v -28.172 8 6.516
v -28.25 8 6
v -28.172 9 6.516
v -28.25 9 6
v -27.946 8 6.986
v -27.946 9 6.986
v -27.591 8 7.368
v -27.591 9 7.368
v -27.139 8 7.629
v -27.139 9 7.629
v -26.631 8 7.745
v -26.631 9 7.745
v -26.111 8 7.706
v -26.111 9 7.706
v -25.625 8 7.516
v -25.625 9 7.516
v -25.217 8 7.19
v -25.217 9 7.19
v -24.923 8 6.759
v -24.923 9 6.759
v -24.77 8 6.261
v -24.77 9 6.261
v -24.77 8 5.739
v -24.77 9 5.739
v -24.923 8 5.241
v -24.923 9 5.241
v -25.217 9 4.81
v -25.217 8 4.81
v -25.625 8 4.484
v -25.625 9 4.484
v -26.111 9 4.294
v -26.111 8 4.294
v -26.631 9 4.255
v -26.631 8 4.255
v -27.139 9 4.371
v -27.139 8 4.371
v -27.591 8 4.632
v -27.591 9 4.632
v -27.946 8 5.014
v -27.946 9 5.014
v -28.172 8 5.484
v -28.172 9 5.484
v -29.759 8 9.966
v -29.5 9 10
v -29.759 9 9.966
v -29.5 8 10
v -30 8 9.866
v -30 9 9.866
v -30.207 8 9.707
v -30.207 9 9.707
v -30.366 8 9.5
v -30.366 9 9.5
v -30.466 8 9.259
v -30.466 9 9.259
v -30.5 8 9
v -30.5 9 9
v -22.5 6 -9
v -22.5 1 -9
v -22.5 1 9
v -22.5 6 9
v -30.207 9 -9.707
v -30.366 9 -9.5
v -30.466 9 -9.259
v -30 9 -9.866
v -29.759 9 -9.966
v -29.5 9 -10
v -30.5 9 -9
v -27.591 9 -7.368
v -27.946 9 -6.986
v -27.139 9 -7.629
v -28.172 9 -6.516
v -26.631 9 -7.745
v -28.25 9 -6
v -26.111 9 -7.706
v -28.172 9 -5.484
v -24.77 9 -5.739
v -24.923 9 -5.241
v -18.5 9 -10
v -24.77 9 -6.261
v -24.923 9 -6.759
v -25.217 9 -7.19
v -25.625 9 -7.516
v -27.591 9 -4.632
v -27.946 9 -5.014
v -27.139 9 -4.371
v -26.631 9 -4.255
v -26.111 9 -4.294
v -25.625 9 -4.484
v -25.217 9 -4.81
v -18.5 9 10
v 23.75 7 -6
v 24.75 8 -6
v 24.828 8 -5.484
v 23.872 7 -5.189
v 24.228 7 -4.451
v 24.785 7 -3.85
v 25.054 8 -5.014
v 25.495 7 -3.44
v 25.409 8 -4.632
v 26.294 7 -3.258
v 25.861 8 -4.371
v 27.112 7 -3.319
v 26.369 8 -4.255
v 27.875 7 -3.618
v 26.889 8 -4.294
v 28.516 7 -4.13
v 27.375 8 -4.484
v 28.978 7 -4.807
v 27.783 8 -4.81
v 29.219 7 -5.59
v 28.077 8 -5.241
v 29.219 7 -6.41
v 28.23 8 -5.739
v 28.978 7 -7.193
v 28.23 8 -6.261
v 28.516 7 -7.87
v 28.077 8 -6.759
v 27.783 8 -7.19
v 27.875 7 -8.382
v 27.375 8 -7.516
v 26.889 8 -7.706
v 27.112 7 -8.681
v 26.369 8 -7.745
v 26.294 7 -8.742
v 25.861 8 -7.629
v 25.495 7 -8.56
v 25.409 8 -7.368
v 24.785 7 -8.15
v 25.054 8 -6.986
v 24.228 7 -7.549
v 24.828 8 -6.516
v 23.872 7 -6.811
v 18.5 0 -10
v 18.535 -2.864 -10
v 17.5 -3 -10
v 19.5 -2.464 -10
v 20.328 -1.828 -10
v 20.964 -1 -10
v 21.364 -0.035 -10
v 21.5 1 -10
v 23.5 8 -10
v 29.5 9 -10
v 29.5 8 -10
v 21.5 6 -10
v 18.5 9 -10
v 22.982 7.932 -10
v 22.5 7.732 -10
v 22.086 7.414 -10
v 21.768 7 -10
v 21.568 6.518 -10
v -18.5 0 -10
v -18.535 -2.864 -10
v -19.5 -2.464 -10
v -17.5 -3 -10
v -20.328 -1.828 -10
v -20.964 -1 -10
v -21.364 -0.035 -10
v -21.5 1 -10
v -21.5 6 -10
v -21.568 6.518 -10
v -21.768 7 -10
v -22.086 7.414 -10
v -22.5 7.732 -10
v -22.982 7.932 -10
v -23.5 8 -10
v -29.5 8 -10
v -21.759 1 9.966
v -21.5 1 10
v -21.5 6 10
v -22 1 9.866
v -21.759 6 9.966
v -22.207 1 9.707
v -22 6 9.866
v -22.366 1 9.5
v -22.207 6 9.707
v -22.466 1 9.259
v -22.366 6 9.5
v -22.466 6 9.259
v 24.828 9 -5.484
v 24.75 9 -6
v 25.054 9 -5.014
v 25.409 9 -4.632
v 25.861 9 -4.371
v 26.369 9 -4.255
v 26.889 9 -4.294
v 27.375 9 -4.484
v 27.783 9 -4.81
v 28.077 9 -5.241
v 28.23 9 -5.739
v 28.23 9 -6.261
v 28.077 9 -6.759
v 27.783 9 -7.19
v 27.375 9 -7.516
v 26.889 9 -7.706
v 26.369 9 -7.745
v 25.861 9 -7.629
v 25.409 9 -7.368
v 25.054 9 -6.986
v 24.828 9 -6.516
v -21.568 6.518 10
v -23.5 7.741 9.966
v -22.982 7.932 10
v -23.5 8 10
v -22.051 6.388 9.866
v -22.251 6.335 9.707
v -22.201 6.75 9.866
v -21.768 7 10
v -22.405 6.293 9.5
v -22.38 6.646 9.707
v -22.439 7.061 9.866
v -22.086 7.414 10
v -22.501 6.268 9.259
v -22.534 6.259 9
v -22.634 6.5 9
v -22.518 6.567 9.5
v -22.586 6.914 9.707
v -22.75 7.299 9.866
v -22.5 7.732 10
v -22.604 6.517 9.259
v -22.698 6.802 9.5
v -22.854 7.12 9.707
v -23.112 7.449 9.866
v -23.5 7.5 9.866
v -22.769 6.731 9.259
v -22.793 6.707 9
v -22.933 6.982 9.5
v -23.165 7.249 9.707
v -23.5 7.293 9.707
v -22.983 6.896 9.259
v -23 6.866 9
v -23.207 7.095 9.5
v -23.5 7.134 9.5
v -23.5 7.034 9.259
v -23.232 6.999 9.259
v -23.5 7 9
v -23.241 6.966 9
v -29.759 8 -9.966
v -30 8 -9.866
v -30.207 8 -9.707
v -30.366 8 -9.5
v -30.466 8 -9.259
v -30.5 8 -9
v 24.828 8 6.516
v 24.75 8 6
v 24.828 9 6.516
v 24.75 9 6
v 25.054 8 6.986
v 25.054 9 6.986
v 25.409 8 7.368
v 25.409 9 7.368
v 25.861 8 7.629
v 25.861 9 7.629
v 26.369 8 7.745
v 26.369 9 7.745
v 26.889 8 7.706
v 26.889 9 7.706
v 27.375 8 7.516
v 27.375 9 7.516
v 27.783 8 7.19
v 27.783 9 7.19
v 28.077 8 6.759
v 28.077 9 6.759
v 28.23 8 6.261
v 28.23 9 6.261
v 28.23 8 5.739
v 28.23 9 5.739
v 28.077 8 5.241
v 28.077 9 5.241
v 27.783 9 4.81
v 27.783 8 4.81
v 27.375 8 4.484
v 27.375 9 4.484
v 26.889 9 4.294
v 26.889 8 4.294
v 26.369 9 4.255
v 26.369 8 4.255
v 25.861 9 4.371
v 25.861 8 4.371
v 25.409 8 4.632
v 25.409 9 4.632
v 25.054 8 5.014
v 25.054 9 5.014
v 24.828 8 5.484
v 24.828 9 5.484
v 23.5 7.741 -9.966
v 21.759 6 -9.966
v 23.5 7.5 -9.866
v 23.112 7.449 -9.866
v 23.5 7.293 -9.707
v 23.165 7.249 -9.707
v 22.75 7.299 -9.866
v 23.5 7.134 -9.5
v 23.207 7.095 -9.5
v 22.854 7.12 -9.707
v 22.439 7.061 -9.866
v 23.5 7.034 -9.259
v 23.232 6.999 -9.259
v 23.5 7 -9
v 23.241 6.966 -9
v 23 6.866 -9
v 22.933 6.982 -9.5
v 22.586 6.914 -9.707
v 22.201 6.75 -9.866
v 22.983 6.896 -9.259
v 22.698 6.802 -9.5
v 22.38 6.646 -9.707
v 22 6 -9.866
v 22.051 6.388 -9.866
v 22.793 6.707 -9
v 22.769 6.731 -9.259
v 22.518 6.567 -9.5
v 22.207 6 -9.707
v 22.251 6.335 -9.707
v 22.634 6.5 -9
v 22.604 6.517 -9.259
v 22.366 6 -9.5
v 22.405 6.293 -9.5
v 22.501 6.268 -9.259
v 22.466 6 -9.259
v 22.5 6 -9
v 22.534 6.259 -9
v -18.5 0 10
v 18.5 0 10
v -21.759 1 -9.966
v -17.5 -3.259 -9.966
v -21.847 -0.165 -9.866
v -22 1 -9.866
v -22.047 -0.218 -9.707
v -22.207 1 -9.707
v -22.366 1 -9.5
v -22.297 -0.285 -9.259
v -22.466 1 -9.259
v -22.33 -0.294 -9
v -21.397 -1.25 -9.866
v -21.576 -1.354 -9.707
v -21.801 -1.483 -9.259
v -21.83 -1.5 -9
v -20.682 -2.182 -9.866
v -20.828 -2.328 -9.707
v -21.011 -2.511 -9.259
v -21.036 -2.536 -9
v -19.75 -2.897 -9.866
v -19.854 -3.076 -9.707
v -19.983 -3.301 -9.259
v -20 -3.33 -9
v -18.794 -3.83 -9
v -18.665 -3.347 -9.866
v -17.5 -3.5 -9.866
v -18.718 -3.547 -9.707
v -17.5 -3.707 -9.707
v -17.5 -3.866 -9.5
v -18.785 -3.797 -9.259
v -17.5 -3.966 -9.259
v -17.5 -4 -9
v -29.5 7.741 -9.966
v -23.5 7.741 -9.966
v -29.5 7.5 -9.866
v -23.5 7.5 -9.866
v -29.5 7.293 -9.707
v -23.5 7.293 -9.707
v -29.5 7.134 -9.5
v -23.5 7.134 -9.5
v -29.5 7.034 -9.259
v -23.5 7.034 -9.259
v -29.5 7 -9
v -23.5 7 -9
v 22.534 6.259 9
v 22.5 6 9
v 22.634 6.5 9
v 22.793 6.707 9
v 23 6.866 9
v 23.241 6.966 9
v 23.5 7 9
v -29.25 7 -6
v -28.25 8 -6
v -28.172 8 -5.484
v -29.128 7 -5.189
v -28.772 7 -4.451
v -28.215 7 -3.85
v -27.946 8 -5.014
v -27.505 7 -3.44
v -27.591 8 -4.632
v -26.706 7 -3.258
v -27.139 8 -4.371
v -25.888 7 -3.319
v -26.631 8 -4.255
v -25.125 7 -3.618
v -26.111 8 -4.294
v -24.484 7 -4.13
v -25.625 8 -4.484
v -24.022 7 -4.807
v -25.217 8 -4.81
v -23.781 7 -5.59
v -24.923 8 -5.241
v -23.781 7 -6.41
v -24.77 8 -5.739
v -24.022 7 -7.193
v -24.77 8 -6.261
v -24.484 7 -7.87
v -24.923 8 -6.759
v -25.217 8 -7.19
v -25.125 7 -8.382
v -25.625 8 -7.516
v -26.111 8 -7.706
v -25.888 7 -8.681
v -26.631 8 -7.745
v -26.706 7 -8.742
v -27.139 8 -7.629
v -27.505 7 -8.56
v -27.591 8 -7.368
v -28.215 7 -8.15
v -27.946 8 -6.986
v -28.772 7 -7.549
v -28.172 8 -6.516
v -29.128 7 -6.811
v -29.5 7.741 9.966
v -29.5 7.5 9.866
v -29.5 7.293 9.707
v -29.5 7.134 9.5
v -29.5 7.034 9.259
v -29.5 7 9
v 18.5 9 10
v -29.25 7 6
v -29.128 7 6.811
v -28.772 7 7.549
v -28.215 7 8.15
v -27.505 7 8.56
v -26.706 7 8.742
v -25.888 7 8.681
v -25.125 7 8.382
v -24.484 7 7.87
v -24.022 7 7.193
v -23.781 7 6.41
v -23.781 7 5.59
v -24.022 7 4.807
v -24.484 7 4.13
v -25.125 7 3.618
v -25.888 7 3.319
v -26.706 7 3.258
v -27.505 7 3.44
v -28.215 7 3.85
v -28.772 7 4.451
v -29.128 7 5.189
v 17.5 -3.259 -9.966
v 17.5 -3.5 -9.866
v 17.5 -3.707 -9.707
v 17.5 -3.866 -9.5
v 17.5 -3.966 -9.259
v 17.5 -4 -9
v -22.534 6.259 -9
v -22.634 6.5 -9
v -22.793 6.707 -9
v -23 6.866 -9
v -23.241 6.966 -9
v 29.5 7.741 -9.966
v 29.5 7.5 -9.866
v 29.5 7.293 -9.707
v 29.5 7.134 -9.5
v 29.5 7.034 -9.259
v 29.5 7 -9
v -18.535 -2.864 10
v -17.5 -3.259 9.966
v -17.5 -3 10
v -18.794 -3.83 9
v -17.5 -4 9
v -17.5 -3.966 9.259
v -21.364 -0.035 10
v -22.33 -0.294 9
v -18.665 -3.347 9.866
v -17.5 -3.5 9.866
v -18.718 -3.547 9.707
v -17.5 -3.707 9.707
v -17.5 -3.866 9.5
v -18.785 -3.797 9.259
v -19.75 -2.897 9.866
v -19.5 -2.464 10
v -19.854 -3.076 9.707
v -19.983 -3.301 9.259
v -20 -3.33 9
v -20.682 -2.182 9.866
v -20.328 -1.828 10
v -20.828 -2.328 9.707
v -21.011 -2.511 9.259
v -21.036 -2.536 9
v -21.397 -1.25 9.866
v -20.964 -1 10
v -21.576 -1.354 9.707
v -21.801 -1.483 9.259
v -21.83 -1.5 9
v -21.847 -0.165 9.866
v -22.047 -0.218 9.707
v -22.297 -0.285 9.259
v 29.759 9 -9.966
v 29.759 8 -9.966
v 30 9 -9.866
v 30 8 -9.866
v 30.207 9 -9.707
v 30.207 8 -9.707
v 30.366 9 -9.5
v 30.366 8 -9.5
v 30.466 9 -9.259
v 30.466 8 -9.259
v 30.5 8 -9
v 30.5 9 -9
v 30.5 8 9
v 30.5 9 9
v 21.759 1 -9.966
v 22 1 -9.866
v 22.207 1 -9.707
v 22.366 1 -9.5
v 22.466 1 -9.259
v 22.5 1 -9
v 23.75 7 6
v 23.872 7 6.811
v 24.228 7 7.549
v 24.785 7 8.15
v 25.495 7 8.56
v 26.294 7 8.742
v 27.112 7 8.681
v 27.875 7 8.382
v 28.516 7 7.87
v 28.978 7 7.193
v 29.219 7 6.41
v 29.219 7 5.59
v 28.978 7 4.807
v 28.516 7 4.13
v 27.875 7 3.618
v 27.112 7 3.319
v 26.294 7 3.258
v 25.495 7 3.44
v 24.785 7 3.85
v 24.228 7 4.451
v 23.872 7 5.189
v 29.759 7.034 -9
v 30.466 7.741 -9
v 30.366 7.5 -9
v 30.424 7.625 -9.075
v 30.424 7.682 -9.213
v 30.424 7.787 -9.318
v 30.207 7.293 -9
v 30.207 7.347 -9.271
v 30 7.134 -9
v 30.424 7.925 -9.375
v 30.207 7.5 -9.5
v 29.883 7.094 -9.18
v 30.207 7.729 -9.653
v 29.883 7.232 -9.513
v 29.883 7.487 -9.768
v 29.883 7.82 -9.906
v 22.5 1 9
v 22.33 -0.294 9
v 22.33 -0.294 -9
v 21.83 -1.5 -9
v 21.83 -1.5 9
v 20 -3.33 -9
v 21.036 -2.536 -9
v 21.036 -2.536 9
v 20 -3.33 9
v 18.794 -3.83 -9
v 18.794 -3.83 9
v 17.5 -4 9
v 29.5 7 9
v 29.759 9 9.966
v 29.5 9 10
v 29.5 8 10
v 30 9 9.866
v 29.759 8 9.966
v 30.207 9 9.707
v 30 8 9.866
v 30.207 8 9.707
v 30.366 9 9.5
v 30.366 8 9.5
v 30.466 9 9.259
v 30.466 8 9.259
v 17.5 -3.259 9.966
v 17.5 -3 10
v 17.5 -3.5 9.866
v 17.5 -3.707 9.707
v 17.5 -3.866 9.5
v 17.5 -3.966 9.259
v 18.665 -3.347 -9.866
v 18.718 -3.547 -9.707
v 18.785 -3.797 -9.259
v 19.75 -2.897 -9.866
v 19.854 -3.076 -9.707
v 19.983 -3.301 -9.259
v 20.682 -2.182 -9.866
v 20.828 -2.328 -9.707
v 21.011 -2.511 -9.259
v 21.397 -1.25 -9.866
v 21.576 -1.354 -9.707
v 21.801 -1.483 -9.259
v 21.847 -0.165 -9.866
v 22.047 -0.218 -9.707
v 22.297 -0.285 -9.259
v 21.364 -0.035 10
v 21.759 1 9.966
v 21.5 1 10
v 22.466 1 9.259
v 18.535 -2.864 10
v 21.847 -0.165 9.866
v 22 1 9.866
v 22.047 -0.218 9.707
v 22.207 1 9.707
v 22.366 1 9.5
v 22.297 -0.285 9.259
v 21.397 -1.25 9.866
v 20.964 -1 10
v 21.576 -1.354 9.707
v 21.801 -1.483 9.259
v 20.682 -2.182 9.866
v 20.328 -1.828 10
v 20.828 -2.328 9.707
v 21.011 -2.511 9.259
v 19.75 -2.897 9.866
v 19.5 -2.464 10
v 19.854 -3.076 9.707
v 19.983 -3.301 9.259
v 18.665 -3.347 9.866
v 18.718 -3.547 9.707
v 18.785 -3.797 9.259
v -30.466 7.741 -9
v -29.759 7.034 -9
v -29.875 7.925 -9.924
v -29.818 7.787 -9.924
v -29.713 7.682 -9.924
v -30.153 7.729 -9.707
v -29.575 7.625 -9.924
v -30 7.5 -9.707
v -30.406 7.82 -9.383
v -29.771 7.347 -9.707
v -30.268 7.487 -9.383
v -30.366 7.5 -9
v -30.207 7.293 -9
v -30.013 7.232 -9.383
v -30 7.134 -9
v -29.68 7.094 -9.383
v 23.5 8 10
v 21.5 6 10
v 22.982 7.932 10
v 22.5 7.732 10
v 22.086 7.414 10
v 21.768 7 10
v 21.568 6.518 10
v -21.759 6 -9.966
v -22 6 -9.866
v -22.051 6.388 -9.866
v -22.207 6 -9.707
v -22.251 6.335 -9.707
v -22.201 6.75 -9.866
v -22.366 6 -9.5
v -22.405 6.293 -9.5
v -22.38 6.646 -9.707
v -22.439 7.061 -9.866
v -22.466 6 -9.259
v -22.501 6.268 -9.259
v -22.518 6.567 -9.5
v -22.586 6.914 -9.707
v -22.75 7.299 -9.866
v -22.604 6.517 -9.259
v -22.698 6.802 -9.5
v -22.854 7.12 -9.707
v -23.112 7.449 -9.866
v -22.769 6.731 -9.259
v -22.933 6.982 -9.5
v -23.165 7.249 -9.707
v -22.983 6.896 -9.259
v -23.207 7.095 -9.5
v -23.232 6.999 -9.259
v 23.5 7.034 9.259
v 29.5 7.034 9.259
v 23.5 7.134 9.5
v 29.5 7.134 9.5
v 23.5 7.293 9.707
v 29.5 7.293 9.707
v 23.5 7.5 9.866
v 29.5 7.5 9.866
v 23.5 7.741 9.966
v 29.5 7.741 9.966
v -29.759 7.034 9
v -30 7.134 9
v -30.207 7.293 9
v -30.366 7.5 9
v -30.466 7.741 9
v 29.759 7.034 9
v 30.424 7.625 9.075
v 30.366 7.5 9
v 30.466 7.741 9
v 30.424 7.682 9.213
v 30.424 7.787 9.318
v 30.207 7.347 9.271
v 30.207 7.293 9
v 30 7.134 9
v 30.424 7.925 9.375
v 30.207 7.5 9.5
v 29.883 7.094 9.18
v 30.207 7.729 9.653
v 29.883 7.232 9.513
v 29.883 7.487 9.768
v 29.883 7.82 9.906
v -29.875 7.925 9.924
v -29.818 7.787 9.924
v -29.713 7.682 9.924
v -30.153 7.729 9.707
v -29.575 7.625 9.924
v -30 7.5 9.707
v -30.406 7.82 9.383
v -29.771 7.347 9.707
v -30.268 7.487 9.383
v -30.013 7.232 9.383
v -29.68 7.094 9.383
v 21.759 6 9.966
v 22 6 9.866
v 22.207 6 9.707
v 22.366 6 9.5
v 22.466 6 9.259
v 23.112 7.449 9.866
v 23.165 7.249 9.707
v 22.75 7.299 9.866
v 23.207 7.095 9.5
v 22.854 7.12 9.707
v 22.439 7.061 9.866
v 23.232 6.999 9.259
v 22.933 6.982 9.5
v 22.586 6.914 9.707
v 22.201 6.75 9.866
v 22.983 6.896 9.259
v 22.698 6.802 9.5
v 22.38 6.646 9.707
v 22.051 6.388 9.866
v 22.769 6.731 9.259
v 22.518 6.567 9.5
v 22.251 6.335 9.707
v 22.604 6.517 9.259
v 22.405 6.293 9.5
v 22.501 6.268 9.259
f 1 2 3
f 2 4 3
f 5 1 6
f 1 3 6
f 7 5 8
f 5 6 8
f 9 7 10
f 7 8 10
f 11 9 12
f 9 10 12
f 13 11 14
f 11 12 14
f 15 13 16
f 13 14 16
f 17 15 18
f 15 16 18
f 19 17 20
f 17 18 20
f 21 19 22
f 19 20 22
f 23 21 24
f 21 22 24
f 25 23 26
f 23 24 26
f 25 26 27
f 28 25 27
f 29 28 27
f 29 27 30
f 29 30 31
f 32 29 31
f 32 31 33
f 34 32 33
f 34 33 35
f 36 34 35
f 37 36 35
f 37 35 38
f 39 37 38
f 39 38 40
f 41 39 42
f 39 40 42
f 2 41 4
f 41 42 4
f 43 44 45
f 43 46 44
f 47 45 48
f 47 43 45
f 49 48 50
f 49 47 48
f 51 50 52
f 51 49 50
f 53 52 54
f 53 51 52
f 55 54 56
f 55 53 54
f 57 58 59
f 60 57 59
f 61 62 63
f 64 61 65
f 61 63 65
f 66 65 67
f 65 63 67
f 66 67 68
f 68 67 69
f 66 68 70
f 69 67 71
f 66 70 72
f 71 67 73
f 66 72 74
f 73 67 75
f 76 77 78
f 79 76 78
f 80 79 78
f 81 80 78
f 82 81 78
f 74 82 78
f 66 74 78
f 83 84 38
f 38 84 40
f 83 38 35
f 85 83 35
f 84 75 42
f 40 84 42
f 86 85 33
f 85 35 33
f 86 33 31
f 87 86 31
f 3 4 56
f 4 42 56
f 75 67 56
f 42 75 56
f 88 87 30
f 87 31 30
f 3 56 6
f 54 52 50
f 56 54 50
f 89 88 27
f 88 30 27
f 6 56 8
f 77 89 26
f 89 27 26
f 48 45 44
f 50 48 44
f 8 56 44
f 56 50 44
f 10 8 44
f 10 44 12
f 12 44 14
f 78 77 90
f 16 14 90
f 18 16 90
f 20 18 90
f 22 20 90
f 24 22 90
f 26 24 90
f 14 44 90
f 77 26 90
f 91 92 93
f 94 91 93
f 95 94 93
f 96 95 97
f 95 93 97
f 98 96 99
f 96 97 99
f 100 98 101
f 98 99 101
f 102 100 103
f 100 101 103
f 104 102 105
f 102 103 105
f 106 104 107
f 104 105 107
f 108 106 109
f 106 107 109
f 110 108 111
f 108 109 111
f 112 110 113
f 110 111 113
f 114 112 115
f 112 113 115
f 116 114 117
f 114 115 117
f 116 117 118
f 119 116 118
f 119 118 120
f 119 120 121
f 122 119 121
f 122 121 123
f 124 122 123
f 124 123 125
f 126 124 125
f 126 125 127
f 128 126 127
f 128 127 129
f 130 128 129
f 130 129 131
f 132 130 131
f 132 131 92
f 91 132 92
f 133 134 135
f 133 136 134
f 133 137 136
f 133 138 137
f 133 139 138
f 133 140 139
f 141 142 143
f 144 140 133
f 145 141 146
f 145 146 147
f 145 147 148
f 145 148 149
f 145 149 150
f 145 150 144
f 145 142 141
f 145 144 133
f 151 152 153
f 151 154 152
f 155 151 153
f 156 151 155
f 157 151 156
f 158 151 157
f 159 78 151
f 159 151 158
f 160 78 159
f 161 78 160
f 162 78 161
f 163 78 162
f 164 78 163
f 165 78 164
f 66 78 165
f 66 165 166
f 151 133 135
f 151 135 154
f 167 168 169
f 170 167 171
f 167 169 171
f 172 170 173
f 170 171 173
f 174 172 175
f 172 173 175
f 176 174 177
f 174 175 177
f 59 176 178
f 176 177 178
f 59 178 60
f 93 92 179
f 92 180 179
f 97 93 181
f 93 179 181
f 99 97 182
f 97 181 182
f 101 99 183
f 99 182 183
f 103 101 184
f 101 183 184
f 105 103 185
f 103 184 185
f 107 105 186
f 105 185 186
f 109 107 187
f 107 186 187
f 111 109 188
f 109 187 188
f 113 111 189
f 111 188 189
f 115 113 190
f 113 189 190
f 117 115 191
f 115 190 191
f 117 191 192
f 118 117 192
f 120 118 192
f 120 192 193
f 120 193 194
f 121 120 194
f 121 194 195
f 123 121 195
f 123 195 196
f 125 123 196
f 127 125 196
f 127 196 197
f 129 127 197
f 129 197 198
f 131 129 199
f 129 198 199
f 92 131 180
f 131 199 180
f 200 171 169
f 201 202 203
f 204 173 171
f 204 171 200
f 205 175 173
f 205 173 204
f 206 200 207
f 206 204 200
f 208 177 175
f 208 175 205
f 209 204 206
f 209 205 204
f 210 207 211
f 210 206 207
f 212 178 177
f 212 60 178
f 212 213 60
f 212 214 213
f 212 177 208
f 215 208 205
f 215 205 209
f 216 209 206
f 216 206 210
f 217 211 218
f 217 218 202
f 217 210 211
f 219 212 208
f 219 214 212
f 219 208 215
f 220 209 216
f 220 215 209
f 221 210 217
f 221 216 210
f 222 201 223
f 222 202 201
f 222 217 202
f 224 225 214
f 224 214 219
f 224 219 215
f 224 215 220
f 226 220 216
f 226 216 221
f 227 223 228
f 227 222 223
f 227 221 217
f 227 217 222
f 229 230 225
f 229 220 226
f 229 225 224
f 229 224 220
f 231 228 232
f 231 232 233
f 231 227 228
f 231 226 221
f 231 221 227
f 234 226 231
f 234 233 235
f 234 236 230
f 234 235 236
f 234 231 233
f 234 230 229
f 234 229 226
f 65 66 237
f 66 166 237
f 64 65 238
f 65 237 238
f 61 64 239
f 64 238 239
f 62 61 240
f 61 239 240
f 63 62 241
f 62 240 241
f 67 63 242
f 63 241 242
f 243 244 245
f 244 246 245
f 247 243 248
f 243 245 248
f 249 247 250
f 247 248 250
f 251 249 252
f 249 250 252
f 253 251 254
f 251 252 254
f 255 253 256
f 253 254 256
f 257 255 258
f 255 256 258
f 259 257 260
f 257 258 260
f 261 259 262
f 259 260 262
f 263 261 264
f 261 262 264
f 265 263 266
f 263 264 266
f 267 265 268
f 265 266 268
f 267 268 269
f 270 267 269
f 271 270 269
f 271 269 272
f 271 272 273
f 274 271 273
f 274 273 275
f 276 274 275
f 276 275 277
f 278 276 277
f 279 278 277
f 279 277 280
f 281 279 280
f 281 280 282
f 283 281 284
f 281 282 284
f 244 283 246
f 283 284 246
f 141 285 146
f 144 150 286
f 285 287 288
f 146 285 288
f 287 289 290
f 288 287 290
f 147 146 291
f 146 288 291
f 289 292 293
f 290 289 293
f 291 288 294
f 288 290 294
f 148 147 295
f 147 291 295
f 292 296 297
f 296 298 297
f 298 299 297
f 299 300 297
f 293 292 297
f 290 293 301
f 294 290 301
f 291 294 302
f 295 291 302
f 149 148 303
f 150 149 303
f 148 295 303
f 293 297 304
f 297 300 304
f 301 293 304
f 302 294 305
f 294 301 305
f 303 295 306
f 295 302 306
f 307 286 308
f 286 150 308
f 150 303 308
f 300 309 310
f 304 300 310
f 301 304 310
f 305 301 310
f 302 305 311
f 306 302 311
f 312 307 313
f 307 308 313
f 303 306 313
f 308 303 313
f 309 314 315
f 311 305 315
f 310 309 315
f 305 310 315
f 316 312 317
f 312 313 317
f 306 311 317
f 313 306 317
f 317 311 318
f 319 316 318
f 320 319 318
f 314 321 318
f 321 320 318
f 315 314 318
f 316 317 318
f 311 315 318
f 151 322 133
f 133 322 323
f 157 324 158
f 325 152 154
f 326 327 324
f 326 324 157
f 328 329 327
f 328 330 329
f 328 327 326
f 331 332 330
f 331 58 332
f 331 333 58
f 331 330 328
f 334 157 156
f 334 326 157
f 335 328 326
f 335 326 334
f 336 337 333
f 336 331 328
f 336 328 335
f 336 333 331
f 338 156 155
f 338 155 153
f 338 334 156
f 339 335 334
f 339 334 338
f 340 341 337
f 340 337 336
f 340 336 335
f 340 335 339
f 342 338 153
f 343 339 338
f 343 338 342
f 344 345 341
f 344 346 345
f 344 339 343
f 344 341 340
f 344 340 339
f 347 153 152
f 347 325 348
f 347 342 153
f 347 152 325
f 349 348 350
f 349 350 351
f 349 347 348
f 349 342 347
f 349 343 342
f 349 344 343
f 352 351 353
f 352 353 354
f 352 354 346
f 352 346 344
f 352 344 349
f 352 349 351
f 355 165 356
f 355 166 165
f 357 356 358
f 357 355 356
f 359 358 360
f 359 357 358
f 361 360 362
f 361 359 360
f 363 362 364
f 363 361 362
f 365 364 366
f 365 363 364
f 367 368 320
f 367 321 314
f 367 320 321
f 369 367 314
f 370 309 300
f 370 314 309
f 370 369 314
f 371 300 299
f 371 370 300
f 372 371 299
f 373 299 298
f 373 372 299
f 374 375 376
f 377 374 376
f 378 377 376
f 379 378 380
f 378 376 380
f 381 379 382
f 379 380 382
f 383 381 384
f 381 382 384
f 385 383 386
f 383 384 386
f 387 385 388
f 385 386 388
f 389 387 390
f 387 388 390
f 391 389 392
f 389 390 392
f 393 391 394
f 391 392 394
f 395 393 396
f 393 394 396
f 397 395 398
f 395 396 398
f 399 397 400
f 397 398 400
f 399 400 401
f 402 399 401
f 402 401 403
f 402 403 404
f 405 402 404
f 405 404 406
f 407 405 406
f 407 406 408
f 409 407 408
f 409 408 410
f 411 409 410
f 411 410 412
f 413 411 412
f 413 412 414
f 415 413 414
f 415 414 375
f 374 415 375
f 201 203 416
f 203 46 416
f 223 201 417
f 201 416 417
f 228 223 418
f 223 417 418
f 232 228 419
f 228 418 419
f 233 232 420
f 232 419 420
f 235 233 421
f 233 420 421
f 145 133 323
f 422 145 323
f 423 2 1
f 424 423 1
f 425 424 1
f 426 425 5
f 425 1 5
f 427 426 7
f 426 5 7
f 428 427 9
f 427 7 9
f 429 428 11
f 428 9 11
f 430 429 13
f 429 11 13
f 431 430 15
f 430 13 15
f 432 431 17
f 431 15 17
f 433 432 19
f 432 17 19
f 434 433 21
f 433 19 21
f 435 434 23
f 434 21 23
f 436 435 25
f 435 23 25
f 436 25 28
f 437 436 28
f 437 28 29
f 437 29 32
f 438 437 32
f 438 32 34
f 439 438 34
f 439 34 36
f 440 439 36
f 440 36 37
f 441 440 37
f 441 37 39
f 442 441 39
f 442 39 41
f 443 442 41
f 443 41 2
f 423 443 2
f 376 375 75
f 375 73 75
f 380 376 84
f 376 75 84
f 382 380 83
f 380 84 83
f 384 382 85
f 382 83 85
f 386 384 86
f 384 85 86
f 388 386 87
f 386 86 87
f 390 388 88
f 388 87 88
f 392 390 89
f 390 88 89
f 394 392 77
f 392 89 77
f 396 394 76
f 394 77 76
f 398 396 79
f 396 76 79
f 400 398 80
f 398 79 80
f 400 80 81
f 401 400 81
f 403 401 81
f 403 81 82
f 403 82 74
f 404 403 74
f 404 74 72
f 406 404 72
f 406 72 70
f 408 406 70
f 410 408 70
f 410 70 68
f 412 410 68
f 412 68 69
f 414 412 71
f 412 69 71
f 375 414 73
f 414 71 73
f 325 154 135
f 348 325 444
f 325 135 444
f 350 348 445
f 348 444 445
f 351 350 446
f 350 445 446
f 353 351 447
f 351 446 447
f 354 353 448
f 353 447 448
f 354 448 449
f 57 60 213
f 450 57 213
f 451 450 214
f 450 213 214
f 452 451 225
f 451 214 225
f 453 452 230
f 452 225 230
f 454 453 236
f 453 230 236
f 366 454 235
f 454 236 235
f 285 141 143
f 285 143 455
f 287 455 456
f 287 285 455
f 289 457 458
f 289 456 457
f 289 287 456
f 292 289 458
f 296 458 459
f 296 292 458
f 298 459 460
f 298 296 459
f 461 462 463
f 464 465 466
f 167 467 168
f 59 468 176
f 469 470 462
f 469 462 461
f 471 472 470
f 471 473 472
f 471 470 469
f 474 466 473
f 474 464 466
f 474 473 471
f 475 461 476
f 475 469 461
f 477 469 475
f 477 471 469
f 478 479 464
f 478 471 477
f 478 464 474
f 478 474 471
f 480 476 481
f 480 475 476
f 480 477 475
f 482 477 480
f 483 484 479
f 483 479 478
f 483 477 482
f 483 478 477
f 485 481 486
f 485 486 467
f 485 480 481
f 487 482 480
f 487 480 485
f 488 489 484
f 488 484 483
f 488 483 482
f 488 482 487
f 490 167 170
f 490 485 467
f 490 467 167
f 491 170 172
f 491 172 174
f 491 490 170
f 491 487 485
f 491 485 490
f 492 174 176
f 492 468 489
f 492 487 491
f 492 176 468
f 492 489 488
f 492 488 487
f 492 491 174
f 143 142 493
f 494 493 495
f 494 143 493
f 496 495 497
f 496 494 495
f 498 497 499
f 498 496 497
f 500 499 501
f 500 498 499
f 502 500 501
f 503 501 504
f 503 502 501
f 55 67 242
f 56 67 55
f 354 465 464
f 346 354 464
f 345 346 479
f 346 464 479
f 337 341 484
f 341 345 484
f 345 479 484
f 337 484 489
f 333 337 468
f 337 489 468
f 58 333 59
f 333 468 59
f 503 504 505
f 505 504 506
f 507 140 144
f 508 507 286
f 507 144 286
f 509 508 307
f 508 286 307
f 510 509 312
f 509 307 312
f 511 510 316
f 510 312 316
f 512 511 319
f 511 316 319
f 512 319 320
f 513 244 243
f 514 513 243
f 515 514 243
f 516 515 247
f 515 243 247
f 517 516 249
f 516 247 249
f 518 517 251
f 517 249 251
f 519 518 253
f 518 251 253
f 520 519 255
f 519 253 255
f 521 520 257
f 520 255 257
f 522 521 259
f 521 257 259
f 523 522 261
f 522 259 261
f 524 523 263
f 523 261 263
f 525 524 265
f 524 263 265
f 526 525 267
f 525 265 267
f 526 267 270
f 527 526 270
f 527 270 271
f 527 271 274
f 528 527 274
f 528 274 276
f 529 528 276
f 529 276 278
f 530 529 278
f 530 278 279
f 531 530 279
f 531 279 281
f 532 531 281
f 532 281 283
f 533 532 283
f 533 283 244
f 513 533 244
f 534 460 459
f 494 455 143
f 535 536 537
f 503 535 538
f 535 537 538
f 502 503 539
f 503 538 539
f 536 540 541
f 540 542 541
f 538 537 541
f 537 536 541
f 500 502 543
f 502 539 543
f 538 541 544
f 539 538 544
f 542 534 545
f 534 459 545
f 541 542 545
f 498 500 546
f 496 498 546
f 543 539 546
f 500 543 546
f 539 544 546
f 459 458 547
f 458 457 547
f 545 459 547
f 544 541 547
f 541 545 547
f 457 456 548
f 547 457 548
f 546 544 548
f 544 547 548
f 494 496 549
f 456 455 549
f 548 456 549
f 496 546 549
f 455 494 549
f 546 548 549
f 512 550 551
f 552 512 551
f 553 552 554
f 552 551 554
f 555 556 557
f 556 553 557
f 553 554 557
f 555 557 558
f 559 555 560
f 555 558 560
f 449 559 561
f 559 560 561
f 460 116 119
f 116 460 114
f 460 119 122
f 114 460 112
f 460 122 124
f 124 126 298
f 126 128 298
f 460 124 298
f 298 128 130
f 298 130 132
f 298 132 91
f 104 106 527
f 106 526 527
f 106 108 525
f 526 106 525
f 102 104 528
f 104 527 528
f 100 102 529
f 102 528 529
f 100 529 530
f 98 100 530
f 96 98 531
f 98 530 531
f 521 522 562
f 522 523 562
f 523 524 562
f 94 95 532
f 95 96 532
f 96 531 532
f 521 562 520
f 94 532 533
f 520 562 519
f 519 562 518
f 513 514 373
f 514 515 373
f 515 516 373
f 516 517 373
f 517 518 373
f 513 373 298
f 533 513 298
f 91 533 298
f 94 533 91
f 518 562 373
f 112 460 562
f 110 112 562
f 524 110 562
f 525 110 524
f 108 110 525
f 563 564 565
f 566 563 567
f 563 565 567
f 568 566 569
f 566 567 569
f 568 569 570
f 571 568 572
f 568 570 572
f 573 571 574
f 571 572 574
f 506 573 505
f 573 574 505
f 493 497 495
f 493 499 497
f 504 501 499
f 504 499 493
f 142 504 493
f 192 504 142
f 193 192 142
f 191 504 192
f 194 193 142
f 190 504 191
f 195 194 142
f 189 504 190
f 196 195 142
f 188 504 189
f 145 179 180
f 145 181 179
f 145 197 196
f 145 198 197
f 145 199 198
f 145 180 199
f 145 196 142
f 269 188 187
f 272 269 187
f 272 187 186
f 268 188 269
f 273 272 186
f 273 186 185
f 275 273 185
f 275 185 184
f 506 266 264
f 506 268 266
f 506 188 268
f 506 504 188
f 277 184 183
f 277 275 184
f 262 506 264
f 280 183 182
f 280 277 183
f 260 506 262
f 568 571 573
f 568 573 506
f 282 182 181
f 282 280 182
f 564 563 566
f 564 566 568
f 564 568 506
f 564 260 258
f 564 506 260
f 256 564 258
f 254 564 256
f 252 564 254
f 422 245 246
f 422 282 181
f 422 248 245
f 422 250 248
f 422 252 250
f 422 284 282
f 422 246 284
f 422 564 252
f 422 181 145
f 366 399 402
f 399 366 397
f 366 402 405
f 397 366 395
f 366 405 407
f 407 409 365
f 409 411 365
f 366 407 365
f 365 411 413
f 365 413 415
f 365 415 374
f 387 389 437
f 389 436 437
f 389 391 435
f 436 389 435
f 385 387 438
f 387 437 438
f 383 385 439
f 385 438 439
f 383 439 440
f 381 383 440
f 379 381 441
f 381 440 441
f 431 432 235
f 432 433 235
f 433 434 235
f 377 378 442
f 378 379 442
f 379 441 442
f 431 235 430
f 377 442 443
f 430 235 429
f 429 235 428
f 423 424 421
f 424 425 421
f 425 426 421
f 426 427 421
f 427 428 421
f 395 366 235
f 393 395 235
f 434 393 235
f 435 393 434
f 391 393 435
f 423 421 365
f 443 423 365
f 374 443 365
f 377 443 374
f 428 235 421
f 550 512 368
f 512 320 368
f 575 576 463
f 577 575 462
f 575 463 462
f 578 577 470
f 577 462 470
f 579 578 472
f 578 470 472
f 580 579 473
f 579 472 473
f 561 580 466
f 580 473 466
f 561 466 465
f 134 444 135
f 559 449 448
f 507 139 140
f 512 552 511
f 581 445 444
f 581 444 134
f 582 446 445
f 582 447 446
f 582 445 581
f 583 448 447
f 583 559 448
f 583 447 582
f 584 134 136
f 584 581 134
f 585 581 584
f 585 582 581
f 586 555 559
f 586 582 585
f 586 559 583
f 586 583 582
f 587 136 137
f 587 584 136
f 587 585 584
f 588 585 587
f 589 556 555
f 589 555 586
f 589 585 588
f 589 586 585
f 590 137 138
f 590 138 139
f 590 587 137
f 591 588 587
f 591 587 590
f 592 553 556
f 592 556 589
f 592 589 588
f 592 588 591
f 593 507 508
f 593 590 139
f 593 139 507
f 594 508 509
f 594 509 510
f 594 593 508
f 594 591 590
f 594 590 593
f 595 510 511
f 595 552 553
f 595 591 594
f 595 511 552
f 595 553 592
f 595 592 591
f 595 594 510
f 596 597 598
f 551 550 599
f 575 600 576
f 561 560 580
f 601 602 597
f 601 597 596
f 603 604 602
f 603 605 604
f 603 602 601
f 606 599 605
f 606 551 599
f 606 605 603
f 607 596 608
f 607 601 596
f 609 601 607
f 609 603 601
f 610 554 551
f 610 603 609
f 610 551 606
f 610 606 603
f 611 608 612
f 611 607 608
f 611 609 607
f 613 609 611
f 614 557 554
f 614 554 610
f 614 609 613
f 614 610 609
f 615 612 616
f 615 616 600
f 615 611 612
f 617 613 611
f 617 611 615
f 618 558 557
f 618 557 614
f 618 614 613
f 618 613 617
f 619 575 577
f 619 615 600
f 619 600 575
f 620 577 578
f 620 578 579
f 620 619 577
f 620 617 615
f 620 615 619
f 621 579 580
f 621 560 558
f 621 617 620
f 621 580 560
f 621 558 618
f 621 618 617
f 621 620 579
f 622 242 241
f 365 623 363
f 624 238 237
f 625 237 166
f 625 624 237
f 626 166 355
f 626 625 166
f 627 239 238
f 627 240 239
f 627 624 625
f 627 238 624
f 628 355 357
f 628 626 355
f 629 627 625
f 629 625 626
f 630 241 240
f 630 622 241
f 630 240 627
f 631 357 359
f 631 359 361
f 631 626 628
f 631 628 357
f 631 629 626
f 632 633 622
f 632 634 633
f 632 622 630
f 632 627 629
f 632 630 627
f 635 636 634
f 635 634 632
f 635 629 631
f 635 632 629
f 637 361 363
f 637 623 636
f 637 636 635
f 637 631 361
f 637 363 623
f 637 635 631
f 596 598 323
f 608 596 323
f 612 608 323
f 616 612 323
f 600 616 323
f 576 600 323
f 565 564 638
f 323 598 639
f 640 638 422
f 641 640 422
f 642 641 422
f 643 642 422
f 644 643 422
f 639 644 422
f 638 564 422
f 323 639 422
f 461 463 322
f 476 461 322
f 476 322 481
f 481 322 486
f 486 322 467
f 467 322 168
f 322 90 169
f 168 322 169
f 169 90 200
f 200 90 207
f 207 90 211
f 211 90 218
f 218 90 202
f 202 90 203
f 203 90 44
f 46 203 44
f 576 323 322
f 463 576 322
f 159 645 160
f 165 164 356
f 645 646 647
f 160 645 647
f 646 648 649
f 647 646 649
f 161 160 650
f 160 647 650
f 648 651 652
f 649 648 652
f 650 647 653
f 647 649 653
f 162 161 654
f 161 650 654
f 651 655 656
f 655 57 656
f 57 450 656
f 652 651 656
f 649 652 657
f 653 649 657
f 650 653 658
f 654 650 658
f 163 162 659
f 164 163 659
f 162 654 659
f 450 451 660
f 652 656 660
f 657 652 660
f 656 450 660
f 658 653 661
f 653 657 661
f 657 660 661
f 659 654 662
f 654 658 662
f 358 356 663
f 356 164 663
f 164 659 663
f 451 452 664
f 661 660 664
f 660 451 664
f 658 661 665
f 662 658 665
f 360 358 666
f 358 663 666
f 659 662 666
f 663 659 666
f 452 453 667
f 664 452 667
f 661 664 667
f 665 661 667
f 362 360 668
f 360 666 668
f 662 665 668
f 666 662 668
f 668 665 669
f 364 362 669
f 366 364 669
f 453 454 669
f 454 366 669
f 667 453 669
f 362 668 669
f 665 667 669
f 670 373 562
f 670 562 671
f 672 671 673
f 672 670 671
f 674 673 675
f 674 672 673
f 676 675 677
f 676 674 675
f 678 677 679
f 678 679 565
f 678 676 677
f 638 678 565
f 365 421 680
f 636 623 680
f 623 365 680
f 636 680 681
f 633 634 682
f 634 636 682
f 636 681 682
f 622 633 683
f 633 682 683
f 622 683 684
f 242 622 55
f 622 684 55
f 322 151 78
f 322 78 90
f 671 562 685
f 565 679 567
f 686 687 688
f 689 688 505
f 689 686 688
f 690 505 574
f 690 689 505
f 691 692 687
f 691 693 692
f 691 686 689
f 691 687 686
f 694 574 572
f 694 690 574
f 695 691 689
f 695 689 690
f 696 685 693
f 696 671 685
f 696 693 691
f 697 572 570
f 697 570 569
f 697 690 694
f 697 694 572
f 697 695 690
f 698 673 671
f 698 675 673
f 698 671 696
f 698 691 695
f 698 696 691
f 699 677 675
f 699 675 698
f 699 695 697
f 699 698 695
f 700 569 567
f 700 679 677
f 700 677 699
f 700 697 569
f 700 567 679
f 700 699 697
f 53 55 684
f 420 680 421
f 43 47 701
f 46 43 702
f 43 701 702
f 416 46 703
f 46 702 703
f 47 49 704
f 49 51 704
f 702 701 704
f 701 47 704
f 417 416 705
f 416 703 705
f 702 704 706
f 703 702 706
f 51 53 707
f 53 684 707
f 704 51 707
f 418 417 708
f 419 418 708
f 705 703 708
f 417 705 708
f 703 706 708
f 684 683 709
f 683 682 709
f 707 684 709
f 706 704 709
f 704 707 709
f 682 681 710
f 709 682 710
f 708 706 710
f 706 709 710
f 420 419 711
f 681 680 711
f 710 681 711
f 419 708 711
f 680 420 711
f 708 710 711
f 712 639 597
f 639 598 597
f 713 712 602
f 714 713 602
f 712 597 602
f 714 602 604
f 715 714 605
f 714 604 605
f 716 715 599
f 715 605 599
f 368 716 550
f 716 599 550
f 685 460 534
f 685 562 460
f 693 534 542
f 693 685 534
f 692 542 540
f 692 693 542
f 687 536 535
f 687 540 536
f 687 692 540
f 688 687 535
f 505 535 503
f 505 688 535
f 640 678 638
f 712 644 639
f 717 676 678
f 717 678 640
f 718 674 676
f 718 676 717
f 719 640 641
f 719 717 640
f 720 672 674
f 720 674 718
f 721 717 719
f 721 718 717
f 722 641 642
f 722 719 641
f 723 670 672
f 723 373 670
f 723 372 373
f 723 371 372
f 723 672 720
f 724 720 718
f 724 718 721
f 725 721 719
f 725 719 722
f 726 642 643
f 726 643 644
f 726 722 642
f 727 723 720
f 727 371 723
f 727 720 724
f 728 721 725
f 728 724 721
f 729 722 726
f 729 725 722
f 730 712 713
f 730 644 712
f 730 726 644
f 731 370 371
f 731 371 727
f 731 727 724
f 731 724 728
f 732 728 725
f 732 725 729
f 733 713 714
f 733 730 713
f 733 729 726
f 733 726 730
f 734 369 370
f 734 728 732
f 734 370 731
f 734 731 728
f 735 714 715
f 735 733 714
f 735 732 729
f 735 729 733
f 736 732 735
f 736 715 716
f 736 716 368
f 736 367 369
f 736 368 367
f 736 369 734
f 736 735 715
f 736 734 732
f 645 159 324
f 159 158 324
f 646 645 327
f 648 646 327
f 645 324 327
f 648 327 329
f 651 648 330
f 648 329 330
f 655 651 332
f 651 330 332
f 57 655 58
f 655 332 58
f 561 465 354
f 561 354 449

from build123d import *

# Parameters (mm, degrees)
F0_W           = 4
F0_H           = 20
F0_W_2         = 37
F1_DEPTH       = 4
F2_DEPTH       = 9
F3_W           = 8
F3_H           = 20
F4_DEPTH       = 2
F6_D           = 3.5
F6_CSINK_D     = 5.5
F6_CSINK_ANGLE = 90
F7_R           = 5
F8_R           = 1


with BuildPart() as f1:
    # F0 (on Front) → F1 (new body)
    with BuildSketch(Plane.XZ):
        with Locations((-20.5, 0)):
            Rectangle(F0_W, F0_H)
        Rectangle(F0_W_2, F0_H)
        with Locations((20.5, 0)):
            Rectangle(F0_W, F0_H)
    extrude(amount=F1_DEPTH)

    # F0 (on Front) → F2 (join)
    with BuildSketch(Plane.XZ):
        with Locations((-20.5, 0)):
            Rectangle(F0_W, F0_H)
        with Locations((20.5, 0)):
            Rectangle(F0_W, F0_H)
    extrude(amount=-F2_DEPTH)

    # F3 (on face) → F4 (join)
    with BuildSketch(Plane(origin=(0, 9, 0), x_dir=(-1, 0, 0), z_dir=(0, 1, 0))):
        with Locations((-26.5, 0)):
            Rectangle(F3_W, F3_H)
        with Locations((26.5, 0)):
            Rectangle(F3_W, F3_H)
    extrude(amount=-F4_DEPTH)

    # F6 (through all)
    with Locations(Plane.XZ.offset(-7)):
        with Locations((-26.5, -6), (-26.5, 6), (26.5, -6), (26.5, 6)):
            CounterSinkHole(F6_D / 2, F6_CSINK_D / 2, counter_sink_angle=F6_CSINK_ANGLE)

    # F7
    f7_edges = [f1.edges().sort_by_distance(p)[0] for p in [
        (22.5, -4, 0),
        (-22.5, -4, 0),
    ]]
    fillet(f7_edges, radius=F7_R)

    # F8
    f8_edges = [f1.edges().sort_by_distance(p)[0] for p in [
        (22.5, 7, 0),
        (-22.5, 7, 0),
        (26.5, 7, 10),
        (26.5, 7, -10),
        (30.5, 7, 0),
        (-30.5, 7, 0),
        (30.5, 8, 10),
        (30.5, 8, -10),
        (-30.5, 8, 10),
        (-30.5, 8, -10),
        (-22.5, 4, -10),
        (-21.035534, -2.535534, -10),
        (-26.5, 7, -10),
        (0, -4, -10),
        (21.035534, -2.535534, -10),
        (22.5, 4, -10),
        (-22.5, 4, 10),
        (-21.035534, -2.535534, 10),
        (-26.5, 7, 10),
        (0, -4, 10),
        (21.035534, -2.535534, 10),
        (22.5, 4, 10),
    ]]
    fillet(f8_edges, radius=F8_R)


solid = f1.part
